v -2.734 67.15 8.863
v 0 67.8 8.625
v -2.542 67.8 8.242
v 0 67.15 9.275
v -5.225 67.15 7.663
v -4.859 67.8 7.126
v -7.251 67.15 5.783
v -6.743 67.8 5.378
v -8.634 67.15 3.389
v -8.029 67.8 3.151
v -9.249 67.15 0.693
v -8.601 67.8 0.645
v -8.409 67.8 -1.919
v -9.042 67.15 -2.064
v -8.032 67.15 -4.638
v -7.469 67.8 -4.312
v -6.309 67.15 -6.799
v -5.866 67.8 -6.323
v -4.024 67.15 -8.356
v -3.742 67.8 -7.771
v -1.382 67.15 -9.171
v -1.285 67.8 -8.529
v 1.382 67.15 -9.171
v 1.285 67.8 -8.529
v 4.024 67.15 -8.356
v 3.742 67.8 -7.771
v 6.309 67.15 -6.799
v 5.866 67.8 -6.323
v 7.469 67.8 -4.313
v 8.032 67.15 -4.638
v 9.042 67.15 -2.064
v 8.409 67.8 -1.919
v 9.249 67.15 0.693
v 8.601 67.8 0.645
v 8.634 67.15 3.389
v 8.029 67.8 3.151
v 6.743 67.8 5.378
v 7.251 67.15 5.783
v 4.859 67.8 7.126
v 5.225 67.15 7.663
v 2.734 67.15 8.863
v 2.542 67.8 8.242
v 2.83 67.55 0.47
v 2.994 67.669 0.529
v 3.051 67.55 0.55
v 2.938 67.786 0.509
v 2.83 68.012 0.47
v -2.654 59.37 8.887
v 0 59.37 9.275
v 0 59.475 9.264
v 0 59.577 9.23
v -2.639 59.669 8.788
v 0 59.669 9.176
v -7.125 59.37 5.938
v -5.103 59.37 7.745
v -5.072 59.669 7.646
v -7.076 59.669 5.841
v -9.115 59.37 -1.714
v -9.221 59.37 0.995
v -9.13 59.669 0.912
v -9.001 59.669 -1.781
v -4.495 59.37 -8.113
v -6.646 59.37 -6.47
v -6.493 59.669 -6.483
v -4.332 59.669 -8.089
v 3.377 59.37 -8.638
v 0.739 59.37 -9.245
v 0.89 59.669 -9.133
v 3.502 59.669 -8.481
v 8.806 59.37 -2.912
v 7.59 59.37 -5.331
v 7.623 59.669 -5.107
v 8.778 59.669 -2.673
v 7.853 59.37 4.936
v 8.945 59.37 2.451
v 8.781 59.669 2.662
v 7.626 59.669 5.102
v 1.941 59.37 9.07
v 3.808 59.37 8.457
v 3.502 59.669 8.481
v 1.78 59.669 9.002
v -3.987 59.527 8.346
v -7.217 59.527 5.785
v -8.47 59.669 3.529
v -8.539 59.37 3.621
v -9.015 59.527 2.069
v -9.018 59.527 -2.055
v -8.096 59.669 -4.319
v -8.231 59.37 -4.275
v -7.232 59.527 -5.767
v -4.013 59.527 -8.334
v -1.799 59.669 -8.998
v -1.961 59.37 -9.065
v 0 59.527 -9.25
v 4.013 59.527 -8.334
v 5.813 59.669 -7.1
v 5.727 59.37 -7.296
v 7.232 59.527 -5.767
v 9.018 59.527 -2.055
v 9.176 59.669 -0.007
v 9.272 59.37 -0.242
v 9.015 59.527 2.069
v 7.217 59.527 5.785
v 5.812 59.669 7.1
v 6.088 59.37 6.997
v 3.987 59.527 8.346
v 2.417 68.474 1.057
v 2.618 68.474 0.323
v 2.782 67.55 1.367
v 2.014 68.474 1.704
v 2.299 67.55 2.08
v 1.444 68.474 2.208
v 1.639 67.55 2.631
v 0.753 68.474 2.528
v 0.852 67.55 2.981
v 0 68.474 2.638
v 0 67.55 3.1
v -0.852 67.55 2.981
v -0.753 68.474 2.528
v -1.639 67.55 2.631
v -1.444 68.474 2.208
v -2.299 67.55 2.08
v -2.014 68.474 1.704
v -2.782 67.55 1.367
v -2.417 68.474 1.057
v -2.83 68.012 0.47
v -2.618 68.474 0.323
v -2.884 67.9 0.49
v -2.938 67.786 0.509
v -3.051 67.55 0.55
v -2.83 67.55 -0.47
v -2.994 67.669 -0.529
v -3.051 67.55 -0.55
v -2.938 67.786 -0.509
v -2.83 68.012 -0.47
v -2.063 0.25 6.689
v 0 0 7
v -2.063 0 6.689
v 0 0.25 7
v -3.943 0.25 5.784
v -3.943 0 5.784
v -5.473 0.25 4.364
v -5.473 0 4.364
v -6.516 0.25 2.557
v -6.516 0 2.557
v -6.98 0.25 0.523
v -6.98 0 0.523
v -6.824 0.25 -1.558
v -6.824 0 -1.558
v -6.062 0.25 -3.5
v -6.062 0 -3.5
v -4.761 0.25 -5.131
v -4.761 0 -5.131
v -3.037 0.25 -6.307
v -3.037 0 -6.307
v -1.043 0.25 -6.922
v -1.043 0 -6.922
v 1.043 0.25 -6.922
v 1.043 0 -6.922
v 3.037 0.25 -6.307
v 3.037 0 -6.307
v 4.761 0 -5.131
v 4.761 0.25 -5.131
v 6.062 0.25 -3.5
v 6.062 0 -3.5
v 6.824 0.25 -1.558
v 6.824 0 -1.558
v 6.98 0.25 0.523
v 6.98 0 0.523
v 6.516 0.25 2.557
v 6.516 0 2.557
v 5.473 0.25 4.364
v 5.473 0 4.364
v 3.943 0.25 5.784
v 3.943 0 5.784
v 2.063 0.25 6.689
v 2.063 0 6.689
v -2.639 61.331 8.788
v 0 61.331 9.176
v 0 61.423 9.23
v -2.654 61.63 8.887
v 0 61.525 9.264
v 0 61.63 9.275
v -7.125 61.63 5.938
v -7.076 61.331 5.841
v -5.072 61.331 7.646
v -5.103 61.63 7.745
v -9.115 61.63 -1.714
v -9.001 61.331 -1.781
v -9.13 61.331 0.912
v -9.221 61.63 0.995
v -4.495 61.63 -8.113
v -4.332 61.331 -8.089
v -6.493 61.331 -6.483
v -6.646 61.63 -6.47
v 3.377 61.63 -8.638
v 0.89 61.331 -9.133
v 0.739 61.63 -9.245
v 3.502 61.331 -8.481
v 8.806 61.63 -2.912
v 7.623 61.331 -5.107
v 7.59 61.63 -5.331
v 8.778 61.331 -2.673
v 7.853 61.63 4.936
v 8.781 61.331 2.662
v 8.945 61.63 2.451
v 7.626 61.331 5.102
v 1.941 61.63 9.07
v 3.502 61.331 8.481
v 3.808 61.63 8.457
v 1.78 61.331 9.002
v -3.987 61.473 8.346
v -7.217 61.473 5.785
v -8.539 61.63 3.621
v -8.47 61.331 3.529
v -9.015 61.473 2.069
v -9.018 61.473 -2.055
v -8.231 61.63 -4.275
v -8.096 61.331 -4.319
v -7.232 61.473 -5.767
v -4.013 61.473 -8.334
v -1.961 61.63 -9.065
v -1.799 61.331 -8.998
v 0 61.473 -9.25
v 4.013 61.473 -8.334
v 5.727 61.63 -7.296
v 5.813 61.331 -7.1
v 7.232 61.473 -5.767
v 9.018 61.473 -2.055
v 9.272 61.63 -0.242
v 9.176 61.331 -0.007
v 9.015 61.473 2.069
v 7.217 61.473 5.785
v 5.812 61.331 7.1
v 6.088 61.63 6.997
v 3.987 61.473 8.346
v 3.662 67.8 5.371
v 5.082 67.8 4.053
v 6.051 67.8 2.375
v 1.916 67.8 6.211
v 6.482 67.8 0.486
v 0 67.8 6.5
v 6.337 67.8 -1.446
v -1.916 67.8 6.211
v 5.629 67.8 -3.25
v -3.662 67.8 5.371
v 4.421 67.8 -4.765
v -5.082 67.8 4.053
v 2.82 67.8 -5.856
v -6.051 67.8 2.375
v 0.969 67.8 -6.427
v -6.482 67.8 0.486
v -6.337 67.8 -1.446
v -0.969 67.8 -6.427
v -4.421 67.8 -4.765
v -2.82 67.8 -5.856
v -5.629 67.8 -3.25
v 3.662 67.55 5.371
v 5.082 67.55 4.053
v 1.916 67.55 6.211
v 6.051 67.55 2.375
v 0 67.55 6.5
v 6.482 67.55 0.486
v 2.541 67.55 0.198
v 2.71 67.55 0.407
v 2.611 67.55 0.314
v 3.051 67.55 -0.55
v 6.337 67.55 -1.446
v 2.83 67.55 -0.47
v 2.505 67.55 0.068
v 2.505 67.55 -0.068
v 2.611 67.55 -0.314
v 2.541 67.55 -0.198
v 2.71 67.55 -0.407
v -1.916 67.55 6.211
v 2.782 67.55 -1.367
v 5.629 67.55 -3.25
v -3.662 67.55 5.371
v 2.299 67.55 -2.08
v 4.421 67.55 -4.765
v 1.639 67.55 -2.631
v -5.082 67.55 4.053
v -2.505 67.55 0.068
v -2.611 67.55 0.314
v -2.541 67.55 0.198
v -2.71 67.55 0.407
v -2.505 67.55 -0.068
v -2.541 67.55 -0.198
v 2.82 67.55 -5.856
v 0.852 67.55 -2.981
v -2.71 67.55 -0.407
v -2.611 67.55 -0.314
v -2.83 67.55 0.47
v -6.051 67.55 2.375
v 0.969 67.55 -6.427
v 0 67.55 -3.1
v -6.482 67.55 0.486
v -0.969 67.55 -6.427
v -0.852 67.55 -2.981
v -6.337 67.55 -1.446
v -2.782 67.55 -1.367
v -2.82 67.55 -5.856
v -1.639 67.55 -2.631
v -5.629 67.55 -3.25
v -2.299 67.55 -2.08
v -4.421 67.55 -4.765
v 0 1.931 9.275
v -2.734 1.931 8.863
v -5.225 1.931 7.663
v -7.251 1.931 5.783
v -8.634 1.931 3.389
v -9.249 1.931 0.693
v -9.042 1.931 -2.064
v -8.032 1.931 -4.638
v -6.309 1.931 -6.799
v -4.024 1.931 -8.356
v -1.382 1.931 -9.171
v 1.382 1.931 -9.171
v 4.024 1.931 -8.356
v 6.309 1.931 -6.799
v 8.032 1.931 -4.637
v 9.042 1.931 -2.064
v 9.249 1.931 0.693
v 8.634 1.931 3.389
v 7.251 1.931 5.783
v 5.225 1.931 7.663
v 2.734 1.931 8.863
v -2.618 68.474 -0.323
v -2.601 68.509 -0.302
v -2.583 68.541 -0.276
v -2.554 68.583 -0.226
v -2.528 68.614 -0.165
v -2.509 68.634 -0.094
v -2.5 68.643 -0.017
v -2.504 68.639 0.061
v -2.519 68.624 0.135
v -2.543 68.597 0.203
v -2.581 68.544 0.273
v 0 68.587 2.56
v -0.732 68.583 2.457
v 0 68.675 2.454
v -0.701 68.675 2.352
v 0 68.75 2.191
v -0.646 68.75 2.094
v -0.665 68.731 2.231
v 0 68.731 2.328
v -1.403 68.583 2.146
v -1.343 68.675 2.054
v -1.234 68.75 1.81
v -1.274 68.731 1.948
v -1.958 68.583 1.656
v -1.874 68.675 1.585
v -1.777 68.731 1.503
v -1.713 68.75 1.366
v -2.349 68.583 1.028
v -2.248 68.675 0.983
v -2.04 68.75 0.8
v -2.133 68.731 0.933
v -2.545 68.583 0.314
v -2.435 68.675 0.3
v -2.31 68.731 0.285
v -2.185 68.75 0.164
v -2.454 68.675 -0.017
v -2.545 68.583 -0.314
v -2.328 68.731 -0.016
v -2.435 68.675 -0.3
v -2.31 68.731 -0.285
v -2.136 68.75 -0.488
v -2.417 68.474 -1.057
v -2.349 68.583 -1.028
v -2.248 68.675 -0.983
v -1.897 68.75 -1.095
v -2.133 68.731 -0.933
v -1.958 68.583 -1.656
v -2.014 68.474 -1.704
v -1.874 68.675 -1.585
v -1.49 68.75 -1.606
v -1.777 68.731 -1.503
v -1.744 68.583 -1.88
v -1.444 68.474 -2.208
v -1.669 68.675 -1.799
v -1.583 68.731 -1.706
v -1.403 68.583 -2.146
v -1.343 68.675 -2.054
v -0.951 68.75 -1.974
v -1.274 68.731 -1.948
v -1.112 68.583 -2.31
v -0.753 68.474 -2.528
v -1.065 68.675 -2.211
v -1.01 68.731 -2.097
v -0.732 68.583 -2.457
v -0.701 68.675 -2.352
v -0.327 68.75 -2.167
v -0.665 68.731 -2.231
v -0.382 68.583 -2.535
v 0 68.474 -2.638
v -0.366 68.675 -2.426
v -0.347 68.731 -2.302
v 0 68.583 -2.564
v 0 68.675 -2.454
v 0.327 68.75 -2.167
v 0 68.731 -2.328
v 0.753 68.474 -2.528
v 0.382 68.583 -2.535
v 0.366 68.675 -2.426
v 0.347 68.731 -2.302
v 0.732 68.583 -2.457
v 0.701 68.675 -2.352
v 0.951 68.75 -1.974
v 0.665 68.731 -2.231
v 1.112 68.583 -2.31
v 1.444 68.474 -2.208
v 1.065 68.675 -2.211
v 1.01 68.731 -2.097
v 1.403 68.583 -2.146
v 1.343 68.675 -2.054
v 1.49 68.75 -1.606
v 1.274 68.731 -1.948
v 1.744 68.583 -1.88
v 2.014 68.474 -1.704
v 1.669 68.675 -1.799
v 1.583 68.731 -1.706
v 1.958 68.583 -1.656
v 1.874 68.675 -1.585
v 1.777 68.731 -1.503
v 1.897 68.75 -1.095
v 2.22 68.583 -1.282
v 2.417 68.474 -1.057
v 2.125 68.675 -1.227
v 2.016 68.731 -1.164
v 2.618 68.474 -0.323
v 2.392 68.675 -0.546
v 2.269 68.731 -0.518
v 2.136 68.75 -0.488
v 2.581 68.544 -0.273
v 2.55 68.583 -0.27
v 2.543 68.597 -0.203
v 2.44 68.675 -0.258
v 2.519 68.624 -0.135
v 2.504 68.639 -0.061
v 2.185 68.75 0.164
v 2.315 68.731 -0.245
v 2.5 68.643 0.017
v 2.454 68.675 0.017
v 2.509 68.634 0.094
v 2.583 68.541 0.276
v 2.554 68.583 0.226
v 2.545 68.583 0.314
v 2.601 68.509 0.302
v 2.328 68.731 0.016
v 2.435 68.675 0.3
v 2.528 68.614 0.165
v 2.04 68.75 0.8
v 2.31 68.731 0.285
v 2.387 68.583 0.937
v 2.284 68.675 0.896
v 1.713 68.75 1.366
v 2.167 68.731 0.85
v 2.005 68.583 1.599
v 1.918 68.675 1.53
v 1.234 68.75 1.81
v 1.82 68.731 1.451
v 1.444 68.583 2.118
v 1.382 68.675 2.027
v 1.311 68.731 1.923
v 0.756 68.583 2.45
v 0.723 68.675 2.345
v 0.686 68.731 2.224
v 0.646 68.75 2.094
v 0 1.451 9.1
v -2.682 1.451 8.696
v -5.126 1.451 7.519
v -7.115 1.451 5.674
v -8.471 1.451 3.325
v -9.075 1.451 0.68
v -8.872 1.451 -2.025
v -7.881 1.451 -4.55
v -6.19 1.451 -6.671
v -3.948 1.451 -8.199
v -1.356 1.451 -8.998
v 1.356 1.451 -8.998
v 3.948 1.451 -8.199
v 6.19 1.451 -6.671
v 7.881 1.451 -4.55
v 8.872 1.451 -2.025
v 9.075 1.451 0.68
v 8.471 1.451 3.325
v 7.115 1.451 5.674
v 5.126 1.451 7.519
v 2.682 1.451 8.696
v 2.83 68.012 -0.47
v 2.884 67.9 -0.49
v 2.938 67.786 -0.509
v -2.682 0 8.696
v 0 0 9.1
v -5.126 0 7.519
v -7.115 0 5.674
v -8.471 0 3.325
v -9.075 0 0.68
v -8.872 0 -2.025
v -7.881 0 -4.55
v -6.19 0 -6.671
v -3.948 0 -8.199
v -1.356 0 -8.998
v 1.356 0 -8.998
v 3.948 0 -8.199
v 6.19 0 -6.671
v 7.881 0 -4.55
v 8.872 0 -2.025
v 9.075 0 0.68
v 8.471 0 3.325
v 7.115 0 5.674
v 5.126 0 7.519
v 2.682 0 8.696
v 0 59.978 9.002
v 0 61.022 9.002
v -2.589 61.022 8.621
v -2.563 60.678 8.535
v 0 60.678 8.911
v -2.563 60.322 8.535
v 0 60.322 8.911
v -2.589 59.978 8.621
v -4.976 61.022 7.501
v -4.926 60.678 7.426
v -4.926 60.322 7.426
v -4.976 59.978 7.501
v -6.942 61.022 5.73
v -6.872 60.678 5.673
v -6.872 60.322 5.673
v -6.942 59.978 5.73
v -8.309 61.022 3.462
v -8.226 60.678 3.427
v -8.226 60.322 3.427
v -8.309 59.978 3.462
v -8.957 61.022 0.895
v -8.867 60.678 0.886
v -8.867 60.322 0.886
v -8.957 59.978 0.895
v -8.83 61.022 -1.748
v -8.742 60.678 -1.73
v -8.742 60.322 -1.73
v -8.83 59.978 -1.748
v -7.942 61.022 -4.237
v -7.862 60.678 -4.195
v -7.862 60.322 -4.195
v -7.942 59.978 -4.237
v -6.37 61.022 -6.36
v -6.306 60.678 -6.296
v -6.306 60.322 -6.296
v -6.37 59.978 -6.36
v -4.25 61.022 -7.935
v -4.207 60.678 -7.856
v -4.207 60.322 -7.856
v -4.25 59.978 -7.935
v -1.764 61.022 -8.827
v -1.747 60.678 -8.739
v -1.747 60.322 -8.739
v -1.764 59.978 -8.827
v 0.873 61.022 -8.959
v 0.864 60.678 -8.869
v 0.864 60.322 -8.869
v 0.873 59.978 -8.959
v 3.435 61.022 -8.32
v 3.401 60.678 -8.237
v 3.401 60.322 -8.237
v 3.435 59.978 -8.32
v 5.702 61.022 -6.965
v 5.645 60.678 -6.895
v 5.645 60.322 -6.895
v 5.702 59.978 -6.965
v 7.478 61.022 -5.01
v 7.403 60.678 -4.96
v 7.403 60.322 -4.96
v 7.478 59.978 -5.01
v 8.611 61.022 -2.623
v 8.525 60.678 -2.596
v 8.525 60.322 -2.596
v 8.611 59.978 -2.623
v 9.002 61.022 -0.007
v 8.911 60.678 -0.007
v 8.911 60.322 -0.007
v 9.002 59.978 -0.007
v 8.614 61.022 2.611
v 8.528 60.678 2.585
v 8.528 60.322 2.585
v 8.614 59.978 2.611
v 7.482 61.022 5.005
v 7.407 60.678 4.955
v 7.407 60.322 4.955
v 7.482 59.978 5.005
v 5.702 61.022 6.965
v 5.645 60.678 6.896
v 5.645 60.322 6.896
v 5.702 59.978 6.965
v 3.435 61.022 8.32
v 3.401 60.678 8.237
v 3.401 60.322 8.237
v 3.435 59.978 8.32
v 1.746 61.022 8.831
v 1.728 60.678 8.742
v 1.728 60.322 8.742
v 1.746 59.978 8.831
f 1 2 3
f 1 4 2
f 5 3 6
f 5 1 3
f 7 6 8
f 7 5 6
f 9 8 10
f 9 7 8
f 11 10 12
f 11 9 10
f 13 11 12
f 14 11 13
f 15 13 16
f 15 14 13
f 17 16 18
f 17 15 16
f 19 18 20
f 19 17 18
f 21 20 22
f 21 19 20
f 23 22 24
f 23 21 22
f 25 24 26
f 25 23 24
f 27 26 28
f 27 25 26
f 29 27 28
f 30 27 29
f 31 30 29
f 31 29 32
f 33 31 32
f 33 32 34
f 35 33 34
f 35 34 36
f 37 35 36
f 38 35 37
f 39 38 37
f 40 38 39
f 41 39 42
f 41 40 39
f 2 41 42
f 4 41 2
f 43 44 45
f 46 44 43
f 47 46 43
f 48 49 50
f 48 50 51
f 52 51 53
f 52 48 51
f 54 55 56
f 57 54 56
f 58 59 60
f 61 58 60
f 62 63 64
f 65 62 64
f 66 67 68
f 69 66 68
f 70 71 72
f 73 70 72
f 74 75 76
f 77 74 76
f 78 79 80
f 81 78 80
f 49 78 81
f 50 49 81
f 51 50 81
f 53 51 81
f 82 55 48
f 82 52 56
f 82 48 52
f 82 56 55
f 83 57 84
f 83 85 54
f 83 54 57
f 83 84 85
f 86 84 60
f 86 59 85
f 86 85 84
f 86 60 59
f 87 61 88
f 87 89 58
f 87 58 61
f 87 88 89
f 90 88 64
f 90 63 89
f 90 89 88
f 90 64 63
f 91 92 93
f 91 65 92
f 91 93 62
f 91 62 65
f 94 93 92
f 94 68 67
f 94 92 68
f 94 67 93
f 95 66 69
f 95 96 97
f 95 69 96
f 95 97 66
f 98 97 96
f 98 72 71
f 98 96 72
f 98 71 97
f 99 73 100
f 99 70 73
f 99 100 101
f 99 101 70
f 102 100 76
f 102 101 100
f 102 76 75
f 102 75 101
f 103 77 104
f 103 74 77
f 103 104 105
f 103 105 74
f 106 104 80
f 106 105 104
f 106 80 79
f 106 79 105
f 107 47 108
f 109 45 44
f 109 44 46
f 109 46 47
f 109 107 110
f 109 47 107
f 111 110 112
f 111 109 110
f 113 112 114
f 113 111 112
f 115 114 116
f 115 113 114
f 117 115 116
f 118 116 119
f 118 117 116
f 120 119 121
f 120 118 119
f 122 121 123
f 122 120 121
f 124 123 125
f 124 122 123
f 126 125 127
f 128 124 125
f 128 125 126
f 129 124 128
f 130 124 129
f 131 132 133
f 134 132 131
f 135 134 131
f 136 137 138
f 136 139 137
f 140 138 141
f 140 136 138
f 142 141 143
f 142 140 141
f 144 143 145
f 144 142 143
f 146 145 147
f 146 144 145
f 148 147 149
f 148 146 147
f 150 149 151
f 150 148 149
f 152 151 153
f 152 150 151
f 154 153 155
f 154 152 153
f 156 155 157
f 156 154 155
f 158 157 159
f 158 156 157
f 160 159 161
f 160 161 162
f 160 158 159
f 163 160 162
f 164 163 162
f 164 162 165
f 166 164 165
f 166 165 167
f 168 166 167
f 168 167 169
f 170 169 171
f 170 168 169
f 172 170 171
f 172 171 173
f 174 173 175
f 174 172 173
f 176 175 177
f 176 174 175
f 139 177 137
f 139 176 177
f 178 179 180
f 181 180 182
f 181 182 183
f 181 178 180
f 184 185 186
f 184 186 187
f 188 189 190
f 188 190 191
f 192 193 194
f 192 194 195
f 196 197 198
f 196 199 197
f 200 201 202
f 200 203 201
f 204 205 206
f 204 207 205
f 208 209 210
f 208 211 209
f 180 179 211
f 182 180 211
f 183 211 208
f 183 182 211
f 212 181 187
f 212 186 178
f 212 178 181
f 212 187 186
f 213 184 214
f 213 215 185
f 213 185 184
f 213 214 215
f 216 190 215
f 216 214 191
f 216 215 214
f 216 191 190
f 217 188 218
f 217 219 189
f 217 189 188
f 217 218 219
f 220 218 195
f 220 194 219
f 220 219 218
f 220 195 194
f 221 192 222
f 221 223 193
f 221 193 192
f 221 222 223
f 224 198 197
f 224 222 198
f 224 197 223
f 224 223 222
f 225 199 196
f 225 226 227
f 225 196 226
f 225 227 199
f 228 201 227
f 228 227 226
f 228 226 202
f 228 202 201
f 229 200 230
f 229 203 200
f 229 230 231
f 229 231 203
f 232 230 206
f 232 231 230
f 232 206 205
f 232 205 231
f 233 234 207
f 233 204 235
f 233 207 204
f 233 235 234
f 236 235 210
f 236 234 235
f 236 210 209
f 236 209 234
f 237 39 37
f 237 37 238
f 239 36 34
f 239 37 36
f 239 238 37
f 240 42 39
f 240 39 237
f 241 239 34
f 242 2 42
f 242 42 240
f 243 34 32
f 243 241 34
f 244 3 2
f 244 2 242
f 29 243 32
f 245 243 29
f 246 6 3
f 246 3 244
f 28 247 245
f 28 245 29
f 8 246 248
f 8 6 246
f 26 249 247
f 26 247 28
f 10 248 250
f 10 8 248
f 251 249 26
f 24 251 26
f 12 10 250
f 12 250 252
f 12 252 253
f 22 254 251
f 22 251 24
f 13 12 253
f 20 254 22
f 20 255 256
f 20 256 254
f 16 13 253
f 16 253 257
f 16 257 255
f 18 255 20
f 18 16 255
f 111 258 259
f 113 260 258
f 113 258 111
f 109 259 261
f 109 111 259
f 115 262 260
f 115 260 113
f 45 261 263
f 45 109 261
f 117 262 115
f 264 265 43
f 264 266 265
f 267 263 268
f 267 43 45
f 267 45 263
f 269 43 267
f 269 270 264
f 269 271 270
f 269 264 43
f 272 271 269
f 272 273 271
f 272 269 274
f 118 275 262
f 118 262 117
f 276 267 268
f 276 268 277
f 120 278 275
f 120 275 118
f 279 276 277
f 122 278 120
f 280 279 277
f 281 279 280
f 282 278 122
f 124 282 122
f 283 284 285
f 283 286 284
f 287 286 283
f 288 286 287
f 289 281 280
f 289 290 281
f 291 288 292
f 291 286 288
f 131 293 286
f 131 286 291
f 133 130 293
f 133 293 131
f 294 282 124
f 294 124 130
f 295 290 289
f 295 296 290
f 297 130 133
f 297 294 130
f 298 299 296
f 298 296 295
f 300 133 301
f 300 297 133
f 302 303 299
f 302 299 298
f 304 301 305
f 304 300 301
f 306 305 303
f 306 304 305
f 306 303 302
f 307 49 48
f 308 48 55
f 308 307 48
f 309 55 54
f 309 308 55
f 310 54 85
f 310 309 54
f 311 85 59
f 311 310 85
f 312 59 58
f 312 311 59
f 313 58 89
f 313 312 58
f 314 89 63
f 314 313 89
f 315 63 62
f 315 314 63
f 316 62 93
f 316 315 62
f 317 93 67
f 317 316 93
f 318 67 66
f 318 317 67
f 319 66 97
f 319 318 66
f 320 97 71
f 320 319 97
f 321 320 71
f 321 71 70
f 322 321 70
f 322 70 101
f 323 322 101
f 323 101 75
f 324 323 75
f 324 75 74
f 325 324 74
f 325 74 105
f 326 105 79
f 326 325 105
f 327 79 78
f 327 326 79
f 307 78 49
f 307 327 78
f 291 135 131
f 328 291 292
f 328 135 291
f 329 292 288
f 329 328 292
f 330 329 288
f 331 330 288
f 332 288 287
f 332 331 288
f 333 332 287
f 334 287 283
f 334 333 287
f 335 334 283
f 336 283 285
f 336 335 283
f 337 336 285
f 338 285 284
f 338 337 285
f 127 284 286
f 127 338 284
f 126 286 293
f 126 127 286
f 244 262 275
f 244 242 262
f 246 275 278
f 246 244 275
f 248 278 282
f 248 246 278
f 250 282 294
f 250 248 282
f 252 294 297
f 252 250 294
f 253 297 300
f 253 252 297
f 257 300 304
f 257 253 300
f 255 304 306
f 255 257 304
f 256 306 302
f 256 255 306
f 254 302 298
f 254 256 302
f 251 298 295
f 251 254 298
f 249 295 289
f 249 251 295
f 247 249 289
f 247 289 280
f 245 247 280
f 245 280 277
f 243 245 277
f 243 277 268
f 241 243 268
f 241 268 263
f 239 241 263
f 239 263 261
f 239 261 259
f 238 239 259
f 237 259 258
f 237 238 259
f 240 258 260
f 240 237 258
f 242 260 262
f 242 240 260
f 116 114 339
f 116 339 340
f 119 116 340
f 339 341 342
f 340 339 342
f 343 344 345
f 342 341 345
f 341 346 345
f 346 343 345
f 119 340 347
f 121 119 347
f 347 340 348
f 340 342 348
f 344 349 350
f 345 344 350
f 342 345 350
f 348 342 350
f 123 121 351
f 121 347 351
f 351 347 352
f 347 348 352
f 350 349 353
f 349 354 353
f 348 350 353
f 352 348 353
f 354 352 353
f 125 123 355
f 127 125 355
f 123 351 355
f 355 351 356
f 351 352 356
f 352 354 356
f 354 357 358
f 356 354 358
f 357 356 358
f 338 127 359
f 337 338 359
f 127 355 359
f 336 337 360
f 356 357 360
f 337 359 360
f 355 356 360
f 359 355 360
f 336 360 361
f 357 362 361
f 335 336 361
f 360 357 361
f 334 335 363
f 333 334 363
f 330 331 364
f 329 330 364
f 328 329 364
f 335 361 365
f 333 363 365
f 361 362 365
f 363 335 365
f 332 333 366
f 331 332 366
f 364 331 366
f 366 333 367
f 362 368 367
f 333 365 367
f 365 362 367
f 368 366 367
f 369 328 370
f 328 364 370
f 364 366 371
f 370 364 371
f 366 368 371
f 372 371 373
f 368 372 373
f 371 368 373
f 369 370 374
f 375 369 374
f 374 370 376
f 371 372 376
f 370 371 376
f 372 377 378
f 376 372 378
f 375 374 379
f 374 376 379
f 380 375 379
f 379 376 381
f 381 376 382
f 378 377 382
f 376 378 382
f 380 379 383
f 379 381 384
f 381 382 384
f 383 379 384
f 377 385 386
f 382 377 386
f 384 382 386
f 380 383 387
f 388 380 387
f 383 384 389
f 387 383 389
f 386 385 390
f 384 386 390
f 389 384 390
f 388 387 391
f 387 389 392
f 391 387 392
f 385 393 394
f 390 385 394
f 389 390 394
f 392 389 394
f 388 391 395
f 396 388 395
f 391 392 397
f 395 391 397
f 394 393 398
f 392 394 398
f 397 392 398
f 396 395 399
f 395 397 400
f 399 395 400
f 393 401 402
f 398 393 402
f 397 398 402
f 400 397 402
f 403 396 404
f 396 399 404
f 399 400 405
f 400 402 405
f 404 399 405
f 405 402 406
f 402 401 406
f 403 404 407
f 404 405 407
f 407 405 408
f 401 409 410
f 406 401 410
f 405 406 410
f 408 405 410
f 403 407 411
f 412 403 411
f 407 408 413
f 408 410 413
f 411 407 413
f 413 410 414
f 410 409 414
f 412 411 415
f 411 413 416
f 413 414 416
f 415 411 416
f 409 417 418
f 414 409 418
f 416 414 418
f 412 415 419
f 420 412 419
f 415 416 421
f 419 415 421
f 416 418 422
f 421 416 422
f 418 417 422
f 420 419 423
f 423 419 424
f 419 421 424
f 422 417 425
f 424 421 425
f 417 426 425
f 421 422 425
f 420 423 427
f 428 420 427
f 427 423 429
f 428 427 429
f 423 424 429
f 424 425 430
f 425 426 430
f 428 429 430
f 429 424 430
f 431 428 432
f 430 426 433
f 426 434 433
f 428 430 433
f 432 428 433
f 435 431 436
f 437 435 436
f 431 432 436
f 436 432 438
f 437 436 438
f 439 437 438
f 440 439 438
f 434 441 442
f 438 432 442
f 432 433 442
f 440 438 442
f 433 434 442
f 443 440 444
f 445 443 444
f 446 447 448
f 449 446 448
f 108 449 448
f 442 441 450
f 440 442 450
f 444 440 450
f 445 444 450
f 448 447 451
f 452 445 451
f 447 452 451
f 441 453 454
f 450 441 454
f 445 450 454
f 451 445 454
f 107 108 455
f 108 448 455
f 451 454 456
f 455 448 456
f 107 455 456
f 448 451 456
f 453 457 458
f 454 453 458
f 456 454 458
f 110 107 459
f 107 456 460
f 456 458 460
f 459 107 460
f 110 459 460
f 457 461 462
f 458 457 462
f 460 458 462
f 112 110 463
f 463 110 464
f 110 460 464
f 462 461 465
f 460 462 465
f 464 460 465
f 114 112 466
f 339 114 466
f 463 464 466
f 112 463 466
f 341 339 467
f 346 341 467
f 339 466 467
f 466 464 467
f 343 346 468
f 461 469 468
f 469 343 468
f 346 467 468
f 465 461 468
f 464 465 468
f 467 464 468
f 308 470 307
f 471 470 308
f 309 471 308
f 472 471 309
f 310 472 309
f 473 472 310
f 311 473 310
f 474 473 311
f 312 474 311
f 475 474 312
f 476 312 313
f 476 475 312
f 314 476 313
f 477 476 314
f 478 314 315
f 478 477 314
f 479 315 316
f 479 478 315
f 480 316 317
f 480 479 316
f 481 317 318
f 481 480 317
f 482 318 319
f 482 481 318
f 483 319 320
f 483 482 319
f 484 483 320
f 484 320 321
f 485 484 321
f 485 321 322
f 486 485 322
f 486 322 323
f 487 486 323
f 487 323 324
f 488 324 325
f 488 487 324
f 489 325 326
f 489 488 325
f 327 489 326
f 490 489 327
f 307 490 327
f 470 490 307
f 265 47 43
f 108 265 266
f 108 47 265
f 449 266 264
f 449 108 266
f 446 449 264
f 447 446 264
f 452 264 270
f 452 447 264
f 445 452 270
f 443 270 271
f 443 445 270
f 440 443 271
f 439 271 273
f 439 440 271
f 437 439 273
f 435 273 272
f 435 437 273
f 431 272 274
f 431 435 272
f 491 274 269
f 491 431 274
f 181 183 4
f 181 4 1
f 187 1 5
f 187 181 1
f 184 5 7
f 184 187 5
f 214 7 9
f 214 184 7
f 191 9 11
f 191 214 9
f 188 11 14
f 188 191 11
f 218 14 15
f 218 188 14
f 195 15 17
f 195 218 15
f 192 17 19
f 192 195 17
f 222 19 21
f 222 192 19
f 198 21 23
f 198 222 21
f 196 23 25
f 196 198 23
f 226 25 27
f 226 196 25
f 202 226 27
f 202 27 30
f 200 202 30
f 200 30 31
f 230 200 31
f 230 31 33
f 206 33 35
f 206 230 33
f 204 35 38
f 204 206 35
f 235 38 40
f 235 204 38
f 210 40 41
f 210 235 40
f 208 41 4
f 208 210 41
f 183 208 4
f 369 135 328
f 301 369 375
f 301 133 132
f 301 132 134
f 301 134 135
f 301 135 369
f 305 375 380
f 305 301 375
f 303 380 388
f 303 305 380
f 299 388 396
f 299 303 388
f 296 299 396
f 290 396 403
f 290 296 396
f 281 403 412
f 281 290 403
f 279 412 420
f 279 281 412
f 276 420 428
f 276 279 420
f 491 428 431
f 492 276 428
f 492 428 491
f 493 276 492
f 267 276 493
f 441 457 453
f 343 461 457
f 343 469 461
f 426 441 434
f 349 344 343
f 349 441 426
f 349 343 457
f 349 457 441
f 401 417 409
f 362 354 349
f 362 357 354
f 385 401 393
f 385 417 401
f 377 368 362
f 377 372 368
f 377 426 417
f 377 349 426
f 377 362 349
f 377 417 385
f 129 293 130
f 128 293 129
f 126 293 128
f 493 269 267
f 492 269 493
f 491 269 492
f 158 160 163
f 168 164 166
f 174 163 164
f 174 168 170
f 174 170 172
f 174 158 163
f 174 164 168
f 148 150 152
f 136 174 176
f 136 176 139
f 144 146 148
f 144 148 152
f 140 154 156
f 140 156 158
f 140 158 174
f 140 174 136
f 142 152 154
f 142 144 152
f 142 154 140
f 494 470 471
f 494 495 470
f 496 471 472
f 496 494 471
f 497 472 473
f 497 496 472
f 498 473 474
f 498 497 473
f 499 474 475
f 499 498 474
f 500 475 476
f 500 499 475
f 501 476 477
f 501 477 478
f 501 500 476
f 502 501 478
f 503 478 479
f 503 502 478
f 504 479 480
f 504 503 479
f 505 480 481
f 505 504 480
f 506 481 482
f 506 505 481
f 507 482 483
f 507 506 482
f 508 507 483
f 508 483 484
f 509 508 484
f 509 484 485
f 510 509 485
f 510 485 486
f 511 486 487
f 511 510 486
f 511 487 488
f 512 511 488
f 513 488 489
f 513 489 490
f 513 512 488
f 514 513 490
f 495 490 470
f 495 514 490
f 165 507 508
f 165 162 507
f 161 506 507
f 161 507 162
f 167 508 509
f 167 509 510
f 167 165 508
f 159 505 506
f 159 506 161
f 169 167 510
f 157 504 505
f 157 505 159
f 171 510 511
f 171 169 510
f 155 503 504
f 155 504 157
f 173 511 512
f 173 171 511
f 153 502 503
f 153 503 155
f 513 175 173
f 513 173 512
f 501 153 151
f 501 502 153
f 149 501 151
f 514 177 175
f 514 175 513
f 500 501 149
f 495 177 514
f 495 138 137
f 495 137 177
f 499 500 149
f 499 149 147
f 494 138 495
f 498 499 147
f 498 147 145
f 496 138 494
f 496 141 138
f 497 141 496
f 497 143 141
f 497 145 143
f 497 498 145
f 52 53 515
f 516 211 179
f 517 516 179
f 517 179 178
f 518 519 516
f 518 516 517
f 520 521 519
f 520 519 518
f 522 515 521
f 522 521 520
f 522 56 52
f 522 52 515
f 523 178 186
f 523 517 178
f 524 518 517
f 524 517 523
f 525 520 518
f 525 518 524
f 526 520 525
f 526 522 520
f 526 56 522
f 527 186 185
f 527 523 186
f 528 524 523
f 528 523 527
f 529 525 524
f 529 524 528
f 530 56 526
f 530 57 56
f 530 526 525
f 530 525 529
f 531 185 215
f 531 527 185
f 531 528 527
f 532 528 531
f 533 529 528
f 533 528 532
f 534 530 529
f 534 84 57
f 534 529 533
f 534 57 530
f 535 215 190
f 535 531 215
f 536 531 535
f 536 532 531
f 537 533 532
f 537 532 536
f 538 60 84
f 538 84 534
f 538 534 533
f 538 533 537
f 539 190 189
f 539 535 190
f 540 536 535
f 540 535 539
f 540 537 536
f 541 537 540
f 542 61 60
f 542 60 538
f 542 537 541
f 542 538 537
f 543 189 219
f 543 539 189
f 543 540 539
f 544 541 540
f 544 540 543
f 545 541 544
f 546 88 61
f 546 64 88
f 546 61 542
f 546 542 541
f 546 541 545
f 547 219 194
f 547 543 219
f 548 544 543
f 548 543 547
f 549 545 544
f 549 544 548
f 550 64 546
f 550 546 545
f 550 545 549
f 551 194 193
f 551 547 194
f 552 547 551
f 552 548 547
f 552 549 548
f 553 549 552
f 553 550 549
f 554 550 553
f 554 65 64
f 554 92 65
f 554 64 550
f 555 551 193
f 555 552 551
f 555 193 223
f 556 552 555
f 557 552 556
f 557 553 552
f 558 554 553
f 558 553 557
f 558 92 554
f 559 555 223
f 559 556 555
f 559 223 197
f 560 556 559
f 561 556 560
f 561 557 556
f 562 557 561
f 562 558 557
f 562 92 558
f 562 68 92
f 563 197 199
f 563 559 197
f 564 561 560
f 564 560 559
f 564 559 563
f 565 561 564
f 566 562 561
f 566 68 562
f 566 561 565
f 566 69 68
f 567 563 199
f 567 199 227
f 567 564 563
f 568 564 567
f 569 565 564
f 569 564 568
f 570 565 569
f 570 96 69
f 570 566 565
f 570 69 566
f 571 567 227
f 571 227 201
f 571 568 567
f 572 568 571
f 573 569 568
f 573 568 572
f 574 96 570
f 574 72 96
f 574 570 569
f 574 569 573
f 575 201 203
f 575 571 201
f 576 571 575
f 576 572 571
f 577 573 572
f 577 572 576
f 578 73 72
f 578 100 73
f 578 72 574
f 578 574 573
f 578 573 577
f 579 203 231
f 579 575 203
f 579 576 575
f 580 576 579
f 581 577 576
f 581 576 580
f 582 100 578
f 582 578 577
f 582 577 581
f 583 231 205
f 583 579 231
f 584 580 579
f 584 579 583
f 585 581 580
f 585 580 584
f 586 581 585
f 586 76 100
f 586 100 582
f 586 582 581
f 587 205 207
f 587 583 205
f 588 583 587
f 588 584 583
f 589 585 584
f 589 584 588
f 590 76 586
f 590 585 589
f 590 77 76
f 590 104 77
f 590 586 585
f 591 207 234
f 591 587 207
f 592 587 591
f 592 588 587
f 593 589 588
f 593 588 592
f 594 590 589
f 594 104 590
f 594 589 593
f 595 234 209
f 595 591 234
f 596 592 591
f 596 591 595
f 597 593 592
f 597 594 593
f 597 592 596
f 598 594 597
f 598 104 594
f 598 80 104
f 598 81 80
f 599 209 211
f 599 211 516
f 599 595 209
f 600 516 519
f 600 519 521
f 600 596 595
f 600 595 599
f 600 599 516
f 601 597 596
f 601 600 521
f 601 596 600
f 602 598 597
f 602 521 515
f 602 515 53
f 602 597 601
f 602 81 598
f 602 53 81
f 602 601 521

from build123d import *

# Parameters (mm, degrees)
CHAMFER_1_SIZE      = 0.2
CHAMFER_1_SIZE_2    = 0.549495484
FILLET_1_R          = 0.5
CUT_EXTRUDE_1_DEPTH = 1.2


with BuildPart() as part:
    # Sketch1 → Revolve1 (revolve)
    with BuildSketch(Plane.XY, mode=Mode.PRIVATE) as revolve1_sk:
        with BuildLine():
            Line((0, 68.75), (-2.5, 68.75))
            Line((-2.5, 68.75), (-3.1, 67.55))
            Line((-3.1, 67.55), (-6.5, 67.55))
            Line((-6.5, 67.55), (-6.5, 67.8))
            Line((-6.5, 67.8), (-8.625, 67.8))
            Line((-8.625, 67.8), (-9.275, 67.15))
            Line((-9.275, 67.15), (-9.275, 61.45))
            ThreePointArc((-9.275, 61.45), (-8.9, 60.5), (-9.275, 59.55))
            Line((-9.275, 59.55), (-9.275, 2))
            Line((-9.275, 2), (-9.1, 2))
            Line((-9.1, 2), (-9.1, 0))
            Line((-9.1, 0), (-7, 0))
            Line((-7, 0), (-7, 0.25))
            Line((-7, 0.25), (0, 0.25))
            Line((0, 0.25), (0, 68.75))
        make_face()
    revolve(revolve1_sk.sketch.rotate(Axis((0, 93.422769263, 0), (0, -1, 0)), 270), axis=Axis((0, 93.422769263, 0), (0, -1, 0)))

    # Фаска1
    # the kernel refuses this chamfer: 0.549495484, 0.2 mm, written as the material it adds along each edge
    with BuildSketch(Plane(origin=(0, 2, 0), x_dir=(0, 0, 1), z_dir=(1, 0, 0))) as chamfer_1_piece_1_section:
        Polygon((9.1 + CHAMFER_1_SIZE, 0), (9.1, CHAMFER_1_SIZE_2), (9.1, 0), align=None)
    chamfer_1_piece_1 = revolve(axis=Axis((0, 2, 0), (0, -1, 0)), mode=Mode.PRIVATE)
    chamfer_1_piece_1 = chamfer_1_piece_1 & Plane(origin=(0, 1.685840324, 0), x_dir=(0, 0, 1), z_dir=(0, -1, 0)) * Cylinder(9.275, 38, mode=Mode.PRIVATE)
    add(chamfer_1_piece_1)

    # Скругление1
    fillet_1_edges = [part.edges().sort_by_distance(p)[0] for p in [
        (0, 61.45, -9.275),
        (0, 59.55, -9.275),
        (0, 68.75, -2.5),
    ]]
    fillet(fillet_1_edges, radius=FILLET_1_R)

    # Эскиз1 → Вырез-Вытянуть1 (cut)
    with BuildSketch(Plane(origin=(0, 68.75, 0), x_dir=(1, 0, 0), z_dir=(0, 1, 0))):
        with BuildLine():
            Line((-2.830089464, -0.470245053), (-3.050819562, -0.55))
            ThreePointArc((-3.050819562, -0.55), (-3.1, 0), (-3.050819562, 0.55))
            Line((-3.050819562, 0.55), (-2.830089464, 0.470245053))
            ThreePointArc((-2.830089464, 0.470245053), (-2.5, 0), (-2.830089464, -0.470245053))
        make_face()
        with BuildLine():
            Line((2.830089464, 0.470245053), (3.050819562, 0.55))
            ThreePointArc((3.050819562, 0.55), (3.1, 0), (3.050819562, -0.55))
            Line((3.050819562, -0.55), (2.830089464, -0.470245053))
            ThreePointArc((2.830089464, -0.470245053), (2.5, 0), (2.830089464, 0.470245053))
        make_face()
    extrude(amount=-CUT_EXTRUDE_1_DEPTH, mode=Mode.SUBTRACT)


solid = part.part
